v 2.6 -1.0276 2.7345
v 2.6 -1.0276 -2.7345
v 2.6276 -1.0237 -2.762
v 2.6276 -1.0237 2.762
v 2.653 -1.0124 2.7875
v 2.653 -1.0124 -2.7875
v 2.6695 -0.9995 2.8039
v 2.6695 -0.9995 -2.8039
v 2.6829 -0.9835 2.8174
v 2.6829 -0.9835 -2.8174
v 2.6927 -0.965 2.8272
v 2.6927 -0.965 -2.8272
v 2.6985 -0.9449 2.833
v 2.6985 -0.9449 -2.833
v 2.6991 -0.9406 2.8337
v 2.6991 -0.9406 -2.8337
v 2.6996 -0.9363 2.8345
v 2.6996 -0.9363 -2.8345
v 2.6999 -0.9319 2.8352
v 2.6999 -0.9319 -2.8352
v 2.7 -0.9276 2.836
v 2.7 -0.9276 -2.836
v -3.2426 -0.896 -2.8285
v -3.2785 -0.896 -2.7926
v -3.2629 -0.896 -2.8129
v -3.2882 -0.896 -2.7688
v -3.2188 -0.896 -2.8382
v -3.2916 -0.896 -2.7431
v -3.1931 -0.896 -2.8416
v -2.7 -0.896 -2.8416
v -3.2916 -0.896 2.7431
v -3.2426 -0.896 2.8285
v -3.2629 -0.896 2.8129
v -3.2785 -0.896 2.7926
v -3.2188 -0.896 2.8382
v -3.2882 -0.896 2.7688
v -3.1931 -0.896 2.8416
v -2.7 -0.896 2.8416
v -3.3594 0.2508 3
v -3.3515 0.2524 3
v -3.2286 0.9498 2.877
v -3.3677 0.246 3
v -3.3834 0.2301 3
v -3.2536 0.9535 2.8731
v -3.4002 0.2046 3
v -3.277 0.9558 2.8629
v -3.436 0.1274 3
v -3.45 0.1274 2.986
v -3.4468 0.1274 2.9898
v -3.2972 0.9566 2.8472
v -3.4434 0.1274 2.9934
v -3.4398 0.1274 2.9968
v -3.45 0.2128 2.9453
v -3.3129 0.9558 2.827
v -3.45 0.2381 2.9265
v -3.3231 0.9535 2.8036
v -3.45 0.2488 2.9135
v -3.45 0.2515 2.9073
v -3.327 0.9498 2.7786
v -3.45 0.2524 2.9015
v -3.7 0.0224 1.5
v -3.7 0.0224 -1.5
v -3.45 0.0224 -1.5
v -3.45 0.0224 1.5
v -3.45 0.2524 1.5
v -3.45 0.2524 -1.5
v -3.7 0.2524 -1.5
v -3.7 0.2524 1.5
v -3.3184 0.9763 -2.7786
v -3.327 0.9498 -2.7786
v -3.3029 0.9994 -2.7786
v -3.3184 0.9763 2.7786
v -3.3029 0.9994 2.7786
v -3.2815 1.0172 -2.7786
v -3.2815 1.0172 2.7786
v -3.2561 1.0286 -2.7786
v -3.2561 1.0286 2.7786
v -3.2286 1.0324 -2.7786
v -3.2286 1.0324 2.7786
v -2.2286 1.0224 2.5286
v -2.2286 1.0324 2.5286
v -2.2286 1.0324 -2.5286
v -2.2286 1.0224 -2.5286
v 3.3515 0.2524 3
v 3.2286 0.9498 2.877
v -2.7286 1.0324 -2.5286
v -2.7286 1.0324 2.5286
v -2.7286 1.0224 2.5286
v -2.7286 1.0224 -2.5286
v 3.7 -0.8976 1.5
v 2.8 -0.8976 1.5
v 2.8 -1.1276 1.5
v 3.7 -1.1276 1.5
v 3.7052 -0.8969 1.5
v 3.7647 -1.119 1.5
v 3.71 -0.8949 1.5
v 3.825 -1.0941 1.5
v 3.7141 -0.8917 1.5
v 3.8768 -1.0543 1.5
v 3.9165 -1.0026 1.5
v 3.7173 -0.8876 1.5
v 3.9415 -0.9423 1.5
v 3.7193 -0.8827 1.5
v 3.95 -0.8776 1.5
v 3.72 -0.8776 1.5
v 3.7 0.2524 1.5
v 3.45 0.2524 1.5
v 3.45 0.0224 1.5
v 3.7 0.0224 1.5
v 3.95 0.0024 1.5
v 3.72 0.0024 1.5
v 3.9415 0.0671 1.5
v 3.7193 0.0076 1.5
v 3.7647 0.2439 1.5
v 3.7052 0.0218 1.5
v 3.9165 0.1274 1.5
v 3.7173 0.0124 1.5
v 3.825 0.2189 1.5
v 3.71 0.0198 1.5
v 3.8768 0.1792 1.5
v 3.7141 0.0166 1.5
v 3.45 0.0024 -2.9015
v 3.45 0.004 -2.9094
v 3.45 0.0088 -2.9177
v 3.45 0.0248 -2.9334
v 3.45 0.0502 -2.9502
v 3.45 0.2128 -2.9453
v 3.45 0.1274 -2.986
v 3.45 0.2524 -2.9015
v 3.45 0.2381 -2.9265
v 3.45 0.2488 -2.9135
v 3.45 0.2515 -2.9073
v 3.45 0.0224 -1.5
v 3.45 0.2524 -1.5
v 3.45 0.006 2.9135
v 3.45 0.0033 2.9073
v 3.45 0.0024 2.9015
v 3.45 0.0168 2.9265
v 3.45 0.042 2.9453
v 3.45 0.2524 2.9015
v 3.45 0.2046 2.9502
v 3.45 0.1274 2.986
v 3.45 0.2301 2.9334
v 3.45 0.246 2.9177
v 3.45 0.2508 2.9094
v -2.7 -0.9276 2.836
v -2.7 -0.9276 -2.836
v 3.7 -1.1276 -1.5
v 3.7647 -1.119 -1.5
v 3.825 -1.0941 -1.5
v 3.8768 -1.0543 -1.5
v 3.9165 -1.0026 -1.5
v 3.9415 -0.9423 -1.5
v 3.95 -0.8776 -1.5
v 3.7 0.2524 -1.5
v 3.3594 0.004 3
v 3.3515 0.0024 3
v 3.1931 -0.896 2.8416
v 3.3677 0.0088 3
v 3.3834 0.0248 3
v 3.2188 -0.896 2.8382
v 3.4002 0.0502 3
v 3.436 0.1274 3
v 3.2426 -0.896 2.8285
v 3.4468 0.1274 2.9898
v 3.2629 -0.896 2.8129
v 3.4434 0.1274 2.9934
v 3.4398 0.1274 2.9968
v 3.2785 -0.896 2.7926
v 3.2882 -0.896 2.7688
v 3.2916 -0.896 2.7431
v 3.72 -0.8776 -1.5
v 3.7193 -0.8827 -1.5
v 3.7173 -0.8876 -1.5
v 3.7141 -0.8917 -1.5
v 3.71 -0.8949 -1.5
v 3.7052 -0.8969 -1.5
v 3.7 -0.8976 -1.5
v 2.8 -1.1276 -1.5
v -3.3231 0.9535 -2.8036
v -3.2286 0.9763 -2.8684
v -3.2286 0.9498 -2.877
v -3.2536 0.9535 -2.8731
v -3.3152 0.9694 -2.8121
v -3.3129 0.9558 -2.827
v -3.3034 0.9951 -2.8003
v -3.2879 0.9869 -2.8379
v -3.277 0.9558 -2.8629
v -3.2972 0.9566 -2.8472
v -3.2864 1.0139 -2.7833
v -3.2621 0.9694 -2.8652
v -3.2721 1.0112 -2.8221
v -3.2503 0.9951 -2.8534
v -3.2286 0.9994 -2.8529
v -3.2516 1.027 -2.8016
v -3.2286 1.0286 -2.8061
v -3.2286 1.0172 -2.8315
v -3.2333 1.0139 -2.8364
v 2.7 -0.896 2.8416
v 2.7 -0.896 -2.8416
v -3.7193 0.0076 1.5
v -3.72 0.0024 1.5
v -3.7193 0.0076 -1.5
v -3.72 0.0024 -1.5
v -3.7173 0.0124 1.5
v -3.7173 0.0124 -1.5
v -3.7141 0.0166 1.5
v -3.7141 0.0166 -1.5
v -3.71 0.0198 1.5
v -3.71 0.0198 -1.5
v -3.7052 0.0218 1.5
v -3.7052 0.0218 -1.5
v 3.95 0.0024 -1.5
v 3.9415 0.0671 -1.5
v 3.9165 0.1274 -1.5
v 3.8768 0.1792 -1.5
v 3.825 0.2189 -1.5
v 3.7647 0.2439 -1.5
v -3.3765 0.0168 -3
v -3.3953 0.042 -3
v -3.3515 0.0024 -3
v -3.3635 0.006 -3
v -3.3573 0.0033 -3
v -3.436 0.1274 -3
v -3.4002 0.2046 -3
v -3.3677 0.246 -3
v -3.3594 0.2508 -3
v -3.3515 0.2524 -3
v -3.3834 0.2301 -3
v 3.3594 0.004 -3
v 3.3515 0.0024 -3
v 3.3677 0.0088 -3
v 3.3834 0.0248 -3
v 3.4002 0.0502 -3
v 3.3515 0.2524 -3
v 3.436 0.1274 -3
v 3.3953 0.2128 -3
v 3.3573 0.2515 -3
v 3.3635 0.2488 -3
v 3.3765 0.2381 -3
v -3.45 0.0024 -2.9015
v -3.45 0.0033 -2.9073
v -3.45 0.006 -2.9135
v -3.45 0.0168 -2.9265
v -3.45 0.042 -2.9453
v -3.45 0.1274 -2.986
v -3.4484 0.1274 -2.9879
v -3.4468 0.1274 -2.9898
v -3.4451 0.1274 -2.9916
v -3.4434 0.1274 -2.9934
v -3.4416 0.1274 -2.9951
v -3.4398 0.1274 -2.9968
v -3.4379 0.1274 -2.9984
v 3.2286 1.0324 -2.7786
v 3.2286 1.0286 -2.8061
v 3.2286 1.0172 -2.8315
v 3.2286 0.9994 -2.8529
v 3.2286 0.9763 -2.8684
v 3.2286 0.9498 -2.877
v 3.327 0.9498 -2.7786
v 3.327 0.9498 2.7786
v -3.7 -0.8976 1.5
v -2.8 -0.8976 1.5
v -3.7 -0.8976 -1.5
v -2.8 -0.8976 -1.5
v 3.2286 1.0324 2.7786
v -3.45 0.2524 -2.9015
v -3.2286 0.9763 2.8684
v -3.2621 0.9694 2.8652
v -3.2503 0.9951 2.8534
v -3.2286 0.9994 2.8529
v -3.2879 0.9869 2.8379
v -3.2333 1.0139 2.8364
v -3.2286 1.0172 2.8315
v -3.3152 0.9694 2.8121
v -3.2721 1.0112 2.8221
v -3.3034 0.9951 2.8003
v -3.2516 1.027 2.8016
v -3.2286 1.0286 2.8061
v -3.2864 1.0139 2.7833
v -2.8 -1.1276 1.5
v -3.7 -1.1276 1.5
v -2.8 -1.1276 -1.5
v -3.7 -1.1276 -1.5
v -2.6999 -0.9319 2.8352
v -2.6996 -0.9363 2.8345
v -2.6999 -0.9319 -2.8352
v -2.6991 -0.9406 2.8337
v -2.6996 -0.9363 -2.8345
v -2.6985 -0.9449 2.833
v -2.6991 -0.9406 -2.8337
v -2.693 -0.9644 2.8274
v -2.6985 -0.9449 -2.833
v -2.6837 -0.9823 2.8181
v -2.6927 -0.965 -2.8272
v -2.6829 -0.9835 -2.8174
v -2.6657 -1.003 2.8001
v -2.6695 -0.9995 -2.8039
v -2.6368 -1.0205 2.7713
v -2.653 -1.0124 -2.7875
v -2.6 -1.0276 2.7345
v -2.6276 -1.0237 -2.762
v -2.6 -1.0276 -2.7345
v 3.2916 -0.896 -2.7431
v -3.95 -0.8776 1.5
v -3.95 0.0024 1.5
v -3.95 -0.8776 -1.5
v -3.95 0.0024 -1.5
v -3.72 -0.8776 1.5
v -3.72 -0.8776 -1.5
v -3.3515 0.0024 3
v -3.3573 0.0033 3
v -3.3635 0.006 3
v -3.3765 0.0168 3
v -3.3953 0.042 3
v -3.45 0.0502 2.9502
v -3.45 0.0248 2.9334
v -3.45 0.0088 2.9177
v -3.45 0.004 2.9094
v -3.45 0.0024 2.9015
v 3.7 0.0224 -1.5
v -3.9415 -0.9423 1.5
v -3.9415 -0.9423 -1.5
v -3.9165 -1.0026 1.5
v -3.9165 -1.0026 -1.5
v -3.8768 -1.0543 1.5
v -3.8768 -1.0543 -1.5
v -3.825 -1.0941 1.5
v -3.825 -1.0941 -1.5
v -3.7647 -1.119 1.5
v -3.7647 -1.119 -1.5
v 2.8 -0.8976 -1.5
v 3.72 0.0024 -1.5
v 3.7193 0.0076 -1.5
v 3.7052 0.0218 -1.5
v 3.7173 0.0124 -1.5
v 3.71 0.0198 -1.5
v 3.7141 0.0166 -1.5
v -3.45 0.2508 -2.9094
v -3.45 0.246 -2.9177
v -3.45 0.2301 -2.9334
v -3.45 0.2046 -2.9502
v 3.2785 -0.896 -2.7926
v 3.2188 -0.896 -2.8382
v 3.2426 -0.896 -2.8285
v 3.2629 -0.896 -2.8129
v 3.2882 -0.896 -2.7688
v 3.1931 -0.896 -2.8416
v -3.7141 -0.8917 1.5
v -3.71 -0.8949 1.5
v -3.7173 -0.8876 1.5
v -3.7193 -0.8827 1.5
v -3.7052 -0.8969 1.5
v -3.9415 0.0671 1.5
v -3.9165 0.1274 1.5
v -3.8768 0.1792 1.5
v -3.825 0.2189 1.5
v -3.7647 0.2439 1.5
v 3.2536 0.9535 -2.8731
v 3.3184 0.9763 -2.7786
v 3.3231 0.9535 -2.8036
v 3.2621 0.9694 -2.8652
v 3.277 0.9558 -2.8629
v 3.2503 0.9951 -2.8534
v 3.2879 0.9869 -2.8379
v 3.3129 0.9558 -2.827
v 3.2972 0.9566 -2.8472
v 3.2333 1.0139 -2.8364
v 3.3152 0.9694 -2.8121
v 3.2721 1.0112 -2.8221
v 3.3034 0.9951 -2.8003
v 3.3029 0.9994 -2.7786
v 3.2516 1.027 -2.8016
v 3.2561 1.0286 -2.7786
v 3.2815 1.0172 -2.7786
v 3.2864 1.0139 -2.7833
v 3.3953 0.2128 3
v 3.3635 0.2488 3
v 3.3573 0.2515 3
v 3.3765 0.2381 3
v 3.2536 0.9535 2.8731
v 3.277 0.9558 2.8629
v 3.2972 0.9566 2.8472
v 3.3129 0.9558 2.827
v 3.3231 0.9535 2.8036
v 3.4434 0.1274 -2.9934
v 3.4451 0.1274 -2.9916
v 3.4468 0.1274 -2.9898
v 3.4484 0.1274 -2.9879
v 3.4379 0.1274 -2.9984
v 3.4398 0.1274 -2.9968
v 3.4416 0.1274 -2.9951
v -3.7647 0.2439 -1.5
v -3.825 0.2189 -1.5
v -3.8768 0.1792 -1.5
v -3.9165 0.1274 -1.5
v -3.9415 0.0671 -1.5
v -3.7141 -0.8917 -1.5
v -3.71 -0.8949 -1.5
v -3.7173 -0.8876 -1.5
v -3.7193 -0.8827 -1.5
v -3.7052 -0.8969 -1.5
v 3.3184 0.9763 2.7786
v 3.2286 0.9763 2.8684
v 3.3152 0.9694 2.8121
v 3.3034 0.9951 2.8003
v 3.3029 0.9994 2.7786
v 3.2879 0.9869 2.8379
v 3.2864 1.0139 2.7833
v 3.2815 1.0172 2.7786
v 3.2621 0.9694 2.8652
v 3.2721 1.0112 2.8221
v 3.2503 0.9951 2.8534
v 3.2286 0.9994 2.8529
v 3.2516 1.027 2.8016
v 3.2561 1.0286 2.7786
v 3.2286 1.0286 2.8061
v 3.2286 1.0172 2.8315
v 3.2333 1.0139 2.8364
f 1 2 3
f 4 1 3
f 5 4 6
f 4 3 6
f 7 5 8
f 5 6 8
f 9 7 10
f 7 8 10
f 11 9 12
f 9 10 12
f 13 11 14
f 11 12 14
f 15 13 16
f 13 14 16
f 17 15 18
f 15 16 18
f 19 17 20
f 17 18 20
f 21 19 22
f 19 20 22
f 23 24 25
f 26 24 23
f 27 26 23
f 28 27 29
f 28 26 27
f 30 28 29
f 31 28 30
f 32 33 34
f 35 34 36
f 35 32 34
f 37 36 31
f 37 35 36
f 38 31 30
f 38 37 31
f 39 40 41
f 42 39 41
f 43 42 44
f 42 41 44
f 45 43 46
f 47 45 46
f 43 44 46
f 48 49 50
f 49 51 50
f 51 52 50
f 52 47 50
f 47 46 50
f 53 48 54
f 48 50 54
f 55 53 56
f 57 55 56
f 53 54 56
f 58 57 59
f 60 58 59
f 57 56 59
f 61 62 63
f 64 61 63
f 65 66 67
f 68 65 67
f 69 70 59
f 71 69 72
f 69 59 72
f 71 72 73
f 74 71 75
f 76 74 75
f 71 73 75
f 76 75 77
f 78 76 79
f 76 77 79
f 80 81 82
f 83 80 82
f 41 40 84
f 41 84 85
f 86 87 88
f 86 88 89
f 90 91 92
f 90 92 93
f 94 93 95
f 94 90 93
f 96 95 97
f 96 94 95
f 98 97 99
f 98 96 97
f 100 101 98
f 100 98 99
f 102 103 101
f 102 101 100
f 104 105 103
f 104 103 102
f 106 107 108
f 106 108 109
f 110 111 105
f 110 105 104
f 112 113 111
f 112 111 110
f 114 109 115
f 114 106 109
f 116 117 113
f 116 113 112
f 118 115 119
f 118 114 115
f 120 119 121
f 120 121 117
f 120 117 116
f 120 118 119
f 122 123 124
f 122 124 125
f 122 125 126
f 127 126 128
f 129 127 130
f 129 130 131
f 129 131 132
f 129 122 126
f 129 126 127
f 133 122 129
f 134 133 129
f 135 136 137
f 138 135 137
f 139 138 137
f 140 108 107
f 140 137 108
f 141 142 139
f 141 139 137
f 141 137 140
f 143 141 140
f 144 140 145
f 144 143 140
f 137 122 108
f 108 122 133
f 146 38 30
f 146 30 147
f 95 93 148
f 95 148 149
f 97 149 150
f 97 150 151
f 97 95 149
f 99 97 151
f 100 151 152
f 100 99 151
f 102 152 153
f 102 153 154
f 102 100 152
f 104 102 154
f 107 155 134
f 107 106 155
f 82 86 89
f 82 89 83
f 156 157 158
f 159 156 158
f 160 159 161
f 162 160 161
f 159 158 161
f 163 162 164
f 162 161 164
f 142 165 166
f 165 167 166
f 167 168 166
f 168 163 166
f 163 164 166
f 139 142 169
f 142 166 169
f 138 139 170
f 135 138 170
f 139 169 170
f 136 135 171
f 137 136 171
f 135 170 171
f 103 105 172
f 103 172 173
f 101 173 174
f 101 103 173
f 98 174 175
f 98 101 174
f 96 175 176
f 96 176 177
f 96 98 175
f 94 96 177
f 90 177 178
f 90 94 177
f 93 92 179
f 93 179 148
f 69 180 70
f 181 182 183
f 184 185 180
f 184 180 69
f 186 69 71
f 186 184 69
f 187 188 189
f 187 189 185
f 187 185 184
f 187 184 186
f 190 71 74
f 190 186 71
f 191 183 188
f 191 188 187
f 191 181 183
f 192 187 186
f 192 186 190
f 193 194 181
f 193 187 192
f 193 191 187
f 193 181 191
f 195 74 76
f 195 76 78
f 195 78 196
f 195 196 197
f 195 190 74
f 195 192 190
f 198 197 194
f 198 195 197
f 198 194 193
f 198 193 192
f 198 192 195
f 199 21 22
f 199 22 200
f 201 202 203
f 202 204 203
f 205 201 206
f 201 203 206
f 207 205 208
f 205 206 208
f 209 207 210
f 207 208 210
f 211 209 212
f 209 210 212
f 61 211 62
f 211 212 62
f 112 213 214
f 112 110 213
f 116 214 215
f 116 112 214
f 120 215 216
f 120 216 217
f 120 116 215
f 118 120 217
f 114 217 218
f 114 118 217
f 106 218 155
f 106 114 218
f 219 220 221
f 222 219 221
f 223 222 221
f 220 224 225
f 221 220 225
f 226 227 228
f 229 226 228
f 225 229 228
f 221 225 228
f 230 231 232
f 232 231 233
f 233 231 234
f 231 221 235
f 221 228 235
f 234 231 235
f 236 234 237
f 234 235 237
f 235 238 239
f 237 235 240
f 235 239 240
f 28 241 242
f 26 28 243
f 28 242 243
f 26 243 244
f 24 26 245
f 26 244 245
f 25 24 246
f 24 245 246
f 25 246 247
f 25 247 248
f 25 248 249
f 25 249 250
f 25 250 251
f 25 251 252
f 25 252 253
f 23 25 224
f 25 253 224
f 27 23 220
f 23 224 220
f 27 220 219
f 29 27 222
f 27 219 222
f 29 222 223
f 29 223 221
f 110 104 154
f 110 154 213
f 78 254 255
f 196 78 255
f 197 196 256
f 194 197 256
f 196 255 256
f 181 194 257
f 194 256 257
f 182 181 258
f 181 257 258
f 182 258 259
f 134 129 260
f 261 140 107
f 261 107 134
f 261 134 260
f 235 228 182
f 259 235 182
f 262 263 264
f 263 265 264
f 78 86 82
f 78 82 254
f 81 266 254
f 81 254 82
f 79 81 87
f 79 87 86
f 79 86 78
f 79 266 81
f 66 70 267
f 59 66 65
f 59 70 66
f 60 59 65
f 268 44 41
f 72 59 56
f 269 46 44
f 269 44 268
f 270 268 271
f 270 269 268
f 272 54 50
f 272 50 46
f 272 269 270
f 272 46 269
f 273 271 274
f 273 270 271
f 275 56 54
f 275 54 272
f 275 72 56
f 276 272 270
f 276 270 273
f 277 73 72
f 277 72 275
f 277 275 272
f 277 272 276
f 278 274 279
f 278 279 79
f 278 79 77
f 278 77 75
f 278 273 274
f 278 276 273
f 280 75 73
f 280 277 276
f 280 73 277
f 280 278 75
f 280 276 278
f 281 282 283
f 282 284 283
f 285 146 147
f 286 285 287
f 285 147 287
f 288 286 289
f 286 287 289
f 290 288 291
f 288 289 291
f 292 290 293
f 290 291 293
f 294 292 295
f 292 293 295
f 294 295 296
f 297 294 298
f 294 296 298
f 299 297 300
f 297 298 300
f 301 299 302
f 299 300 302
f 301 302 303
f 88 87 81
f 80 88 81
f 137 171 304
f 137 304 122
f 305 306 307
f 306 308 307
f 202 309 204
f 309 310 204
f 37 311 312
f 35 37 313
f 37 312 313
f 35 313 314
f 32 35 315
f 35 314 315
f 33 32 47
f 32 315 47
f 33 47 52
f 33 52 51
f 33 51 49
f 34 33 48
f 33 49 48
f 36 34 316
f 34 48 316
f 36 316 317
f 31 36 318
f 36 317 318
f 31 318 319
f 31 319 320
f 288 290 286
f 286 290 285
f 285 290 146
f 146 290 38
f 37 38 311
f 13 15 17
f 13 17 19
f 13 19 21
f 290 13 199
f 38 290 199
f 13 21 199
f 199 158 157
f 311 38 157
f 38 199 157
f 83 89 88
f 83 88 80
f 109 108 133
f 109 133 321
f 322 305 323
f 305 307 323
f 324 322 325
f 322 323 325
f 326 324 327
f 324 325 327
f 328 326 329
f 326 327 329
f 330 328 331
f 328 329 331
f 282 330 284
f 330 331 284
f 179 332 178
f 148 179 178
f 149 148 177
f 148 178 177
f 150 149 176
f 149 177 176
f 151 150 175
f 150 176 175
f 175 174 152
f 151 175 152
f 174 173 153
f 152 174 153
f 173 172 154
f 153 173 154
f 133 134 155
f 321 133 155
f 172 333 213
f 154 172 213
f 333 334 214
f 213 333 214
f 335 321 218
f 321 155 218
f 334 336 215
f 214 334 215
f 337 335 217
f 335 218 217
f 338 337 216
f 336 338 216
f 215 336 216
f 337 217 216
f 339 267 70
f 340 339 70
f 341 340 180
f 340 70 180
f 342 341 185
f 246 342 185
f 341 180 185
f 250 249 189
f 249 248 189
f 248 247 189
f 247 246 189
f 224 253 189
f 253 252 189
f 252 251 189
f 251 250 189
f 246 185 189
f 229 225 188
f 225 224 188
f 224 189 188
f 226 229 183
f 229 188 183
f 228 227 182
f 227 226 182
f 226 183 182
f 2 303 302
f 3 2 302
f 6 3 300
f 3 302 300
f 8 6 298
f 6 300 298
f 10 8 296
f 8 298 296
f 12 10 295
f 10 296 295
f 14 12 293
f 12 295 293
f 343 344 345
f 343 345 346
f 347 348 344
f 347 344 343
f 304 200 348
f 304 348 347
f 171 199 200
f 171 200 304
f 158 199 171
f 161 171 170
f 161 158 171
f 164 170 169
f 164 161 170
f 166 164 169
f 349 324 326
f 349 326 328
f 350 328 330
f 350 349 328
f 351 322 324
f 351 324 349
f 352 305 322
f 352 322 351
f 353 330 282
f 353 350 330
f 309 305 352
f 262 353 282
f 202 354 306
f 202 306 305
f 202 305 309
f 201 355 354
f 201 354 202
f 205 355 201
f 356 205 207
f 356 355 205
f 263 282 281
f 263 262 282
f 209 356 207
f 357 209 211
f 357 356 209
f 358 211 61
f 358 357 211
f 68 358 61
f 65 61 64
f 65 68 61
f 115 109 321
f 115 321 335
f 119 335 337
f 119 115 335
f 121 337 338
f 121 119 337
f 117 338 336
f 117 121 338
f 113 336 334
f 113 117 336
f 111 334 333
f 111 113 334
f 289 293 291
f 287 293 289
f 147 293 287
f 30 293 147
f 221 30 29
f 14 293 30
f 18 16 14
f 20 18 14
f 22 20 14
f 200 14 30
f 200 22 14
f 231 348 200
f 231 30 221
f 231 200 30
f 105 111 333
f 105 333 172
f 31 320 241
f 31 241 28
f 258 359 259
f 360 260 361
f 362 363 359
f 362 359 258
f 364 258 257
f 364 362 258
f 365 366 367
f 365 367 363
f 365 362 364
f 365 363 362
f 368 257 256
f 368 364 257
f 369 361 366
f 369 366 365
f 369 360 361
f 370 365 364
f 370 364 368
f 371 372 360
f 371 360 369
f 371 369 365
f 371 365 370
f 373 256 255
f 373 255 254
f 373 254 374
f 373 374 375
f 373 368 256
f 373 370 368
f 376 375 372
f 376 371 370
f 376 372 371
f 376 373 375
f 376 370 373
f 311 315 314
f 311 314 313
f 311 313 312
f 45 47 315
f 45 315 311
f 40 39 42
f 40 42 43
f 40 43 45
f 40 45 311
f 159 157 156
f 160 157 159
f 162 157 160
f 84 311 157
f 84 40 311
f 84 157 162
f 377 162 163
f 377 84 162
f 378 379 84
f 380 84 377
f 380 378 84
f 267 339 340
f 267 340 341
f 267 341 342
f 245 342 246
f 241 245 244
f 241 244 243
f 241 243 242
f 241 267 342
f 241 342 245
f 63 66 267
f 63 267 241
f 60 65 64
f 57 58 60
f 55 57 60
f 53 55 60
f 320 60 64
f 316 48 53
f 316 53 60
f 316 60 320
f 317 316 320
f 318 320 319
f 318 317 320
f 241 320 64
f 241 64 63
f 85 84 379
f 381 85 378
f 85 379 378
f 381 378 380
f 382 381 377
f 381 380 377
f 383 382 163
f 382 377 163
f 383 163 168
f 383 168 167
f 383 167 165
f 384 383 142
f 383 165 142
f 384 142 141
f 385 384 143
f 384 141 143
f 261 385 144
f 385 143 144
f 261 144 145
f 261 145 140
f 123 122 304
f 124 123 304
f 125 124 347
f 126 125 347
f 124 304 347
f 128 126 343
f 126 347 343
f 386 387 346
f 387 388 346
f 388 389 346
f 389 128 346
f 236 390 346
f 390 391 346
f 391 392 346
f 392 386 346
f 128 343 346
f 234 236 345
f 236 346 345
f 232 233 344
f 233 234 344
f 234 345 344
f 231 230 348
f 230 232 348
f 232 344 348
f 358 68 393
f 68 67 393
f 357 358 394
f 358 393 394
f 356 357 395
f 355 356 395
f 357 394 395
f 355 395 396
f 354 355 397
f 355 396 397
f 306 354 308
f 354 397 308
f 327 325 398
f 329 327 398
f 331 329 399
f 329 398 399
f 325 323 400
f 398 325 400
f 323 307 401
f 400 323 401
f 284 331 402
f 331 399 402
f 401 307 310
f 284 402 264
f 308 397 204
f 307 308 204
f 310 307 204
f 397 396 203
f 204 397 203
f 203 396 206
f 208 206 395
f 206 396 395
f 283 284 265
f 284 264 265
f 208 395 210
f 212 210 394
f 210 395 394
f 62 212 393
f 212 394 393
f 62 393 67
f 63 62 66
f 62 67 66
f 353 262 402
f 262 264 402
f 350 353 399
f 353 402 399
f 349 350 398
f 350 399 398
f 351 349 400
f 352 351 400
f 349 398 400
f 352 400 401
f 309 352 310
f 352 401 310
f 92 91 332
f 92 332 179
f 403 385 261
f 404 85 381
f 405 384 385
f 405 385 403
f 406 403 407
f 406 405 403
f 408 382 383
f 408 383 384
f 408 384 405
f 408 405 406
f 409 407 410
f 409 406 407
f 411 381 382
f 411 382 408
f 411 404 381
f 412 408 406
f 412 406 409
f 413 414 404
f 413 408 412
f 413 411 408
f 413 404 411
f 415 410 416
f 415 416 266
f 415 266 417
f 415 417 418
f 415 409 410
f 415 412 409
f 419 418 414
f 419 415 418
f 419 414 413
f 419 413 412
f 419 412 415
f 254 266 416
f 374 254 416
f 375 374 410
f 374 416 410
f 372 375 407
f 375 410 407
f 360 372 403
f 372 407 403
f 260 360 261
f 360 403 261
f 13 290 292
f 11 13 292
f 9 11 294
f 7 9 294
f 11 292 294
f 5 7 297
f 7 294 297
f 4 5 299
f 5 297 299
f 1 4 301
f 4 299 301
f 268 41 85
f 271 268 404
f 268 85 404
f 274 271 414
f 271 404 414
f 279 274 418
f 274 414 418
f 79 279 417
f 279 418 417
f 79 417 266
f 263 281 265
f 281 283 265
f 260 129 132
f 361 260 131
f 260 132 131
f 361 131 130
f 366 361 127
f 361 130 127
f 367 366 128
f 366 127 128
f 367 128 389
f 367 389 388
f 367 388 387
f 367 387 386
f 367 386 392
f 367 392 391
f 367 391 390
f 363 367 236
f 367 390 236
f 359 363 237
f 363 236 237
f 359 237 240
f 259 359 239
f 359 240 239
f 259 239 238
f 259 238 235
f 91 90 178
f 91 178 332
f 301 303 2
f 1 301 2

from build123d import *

# Parameters (mm, degrees)
EXTRUDE2_DEPTH  = 3
EXTRUDE10_DEPTH = 5.687050188
EXTRUDE6_DEPTH  = 1.5
FILLET1_R       = 0.1
SKETCH17_W      = 0.5
SKETCH17_H      = 5.057109984
EXTRUDE11_DEPTH = 0.01


with BuildPart() as part:
    # Sketch5 → Extrude2 (new, symmetric)
    with BuildSketch(Plane.XY):
        Polygon((-3.45, 0.252443442), (-3.45, 0.002443442), (-3.291571563, -0.896048874), (-2.7, -0.896048874), (-2.7, -1.027556558), (2.7, -1.027556558), (2.7, -0.896048874), (3.291571563, -0.896048874), (3.45, 0.002443442), (3.45, 0.252443442), (3.312464955, 1.032443442), (-3.312464955, 1.032443442), align=None)
    extrude(amount=EXTRUDE2_DEPTH, both=True)

    # Sketch15 → Extrude10 (cut, symmetric)
    with BuildSketch(Plane(origin=(0, 0, 0), x_dir=(0, 0, -1), z_dir=(1, 0, 0))):
        Polygon((-1.365649055, -24.756382672), (2.66841867, -1.878047724), (3, 0.002443442), (3, 0.252443442), (2.606426498, 2.484509687), (-1.427641227, 25.362844635), (45.034863515, 25.420313828), (45.096855687, -24.698913478), align=None)
    extrude10 = extrude(amount=EXTRUDE10_DEPTH, both=True, mode=Mode.SUBTRACT)

    # Mirror1: Extrude10 across plane
    add(extrude10.mirror(Plane.XY), mode=Mode.SUBTRACT)

    # Sketch9 → Extrude6 (add, symmetric)
    with BuildSketch(Plane.XY):
        with BuildLine():
            Line((-3.45, 0.252443442), (-3.7, 0.252443442))
            ThreePointArc((-3.7, 0.252443442), (-3.876776695, 0.179220137), (-3.95, 0.002443442))
            Line((-3.95, 0.002443442), (-3.95, -0.877556558))
            ThreePointArc((-3.95, -0.877556558), (-3.876776695, -1.054333254), (-3.7, -1.127556558))
            Line((-3.7, -1.127556558), (-2.8, -1.127556558))
            Line((-2.8, -1.127556558), (-2.8, -0.897556558))
            Line((-2.8, -0.897556558), (-3.7, -0.897556558))
            ThreePointArc((-3.7, -0.897556558), (-3.714142136, -0.891698694), (-3.72, -0.877556558))
            Line((-3.72, -0.877556558), (-3.72, 0.002443442))
            ThreePointArc((-3.72, 0.002443442), (-3.714142136, 0.016585577), (-3.7, 0.022443442))
            Line((-3.7, 0.022443442), (-3.45, 0.022443442))
            Line((-3.45, 0.022443442), (-3.45, 0.252443442))
        make_face()
        with BuildLine():
            Line((3.45, 0.252443442), (3.45, 0.022443442))
            Line((3.45, 0.022443442), (3.7, 0.022443442))
            ThreePointArc((3.7, 0.022443442), (3.714142136, 0.016585577), (3.72, 0.002443442))
            Line((3.72, 0.002443442), (3.72, -0.877556558))
            ThreePointArc((3.72, -0.877556558), (3.714142136, -0.891698694), (3.7, -0.897556558))
            Line((3.7, -0.897556558), (2.8, -0.897556558))
            Line((2.8, -0.897556558), (2.8, -1.127556558))
            Line((2.8, -1.127556558), (3.7, -1.127556558))
            ThreePointArc((3.7, -1.127556558), (3.876776695, -1.054333254), (3.95, -0.877556558))
            Line((3.95, -0.877556558), (3.95, 0.002443442))
            ThreePointArc((3.95, 0.002443442), (3.876776695, 0.179220137), (3.7, 0.252443442))
            Line((3.7, 0.252443442), (3.45, 0.252443442))
        make_face()
    extrude(amount=EXTRUDE6_DEPTH, both=True)

    # Fillet1
    # the kernel refuses this fillet: 0.1 mm, written as the material it takes off along each edge
    with BuildSketch(Plane(origin=(-3.228554992, 0.932443442, 2.778554992), x_dir=(-0.707106781186547, 0, -0.707106781186548), z_dir=(-0.508220601732601, 0.6952867321825629, 0.5082206017326002))) as fillet1_piece_1_section:
        Polygon((-0.186219601, -0.186219601), (0.186219601, -0.186219601), (0.186219601, 0.186219601), (-0.186219601, 0.186219601), align=None)
    fillet1_piece_1 = extrude(amount=0.186219601, mode=Mode.PRIVATE)
    fillet1_piece_1 = split(fillet1_piece_1, bisect_by=Plane(origin=(-3.228554992, 0.932443442, 2.778554992), z_dir=(0, 0, 1)), keep=Keep.TOP, mode=Mode.PRIVATE)
    fillet1_piece_1 = split(fillet1_piece_1, bisect_by=Plane(origin=(-3.228554992, 0.932443442, 2.778554992), z_dir=(0.17108786974602874, 0.9702875252478149, -0.1710878697460364)), keep=Keep.TOP, mode=Mode.PRIVATE)
    fillet1_piece_1 = split(fillet1_piece_1, bisect_by=Plane(origin=(-3.228554992, 0.932443442, 2.778554992), z_dir=(-1, 0, 0)), keep=Keep.TOP, mode=Mode.PRIVATE)
    fillet1_piece_1 = split(fillet1_piece_1, bisect_by=Plane(origin=(-3.228554992, 1.032443442, 2.778554992), z_dir=(0, -1, 0)), keep=Keep.TOP, mode=Mode.PRIVATE)
    fillet1_piece_1 = split(fillet1_piece_1, bisect_by=Plane(origin=(-3.327035767, 0.94980826, 2.778554992), z_dir=(0.9848077530122094, -0.17364817766692353, 0)), keep=Keep.TOP, mode=Mode.PRIVATE)
    fillet1_piece_1 = split(fillet1_piece_1, bisect_by=Plane(origin=(-3.228554992, 0.94980826, 2.877035767), z_dir=(0, -0.17364817766693108, -0.984807753012208)), keep=Keep.TOP, mode=Mode.PRIVATE)
    fillet1_piece_1 = fillet1_piece_1 - Plane(origin=(-3.228554992, 0.932443442, 2.778554992), x_dir=(0.508220601732601, -0.6952867321825629, -0.5082206017326002), z_dir=(-0.707106781186547, 0, -0.707106781186548)) * Sphere(FILLET1_R, mode=Mode.PRIVATE)
    add(fillet1_piece_1, mode=Mode.SUBTRACT)
    with BuildSketch(Plane(origin=(-3.228554992, 0.932443442, -2.778554992), x_dir=(0.707106781186547, 0, -0.707106781186548), z_dir=(-0.508220601732601, 0.6952867321825629, -0.5082206017326002))) as fillet1_piece_2_section:
        Polygon((-0.186219601, -0.186219601), (0.186219601, -0.186219601), (0.186219601, 0.186219601), (-0.186219601, 0.186219601), align=None)
    fillet1_piece_2 = extrude(amount=0.186219601, mode=Mode.PRIVATE)
    fillet1_piece_2 = split(fillet1_piece_2, bisect_by=Plane(origin=(-3.228554992, 0.932443442, -2.778554992), z_dir=(0, 0, -1)), keep=Keep.TOP, mode=Mode.PRIVATE)
    fillet1_piece_2 = split(fillet1_piece_2, bisect_by=Plane(origin=(-3.228554992, 0.932443442, -2.778554992), z_dir=(0.17108786974602874, 0.9702875252478149, 0.1710878697460364)), keep=Keep.TOP, mode=Mode.PRIVATE)
    fillet1_piece_2 = split(fillet1_piece_2, bisect_by=Plane(origin=(-3.228554992, 0.932443442, -2.778554992), z_dir=(-1, 0, 0)), keep=Keep.TOP, mode=Mode.PRIVATE)
    fillet1_piece_2 = split(fillet1_piece_2, bisect_by=Plane(origin=(-3.228554992, 1.032443442, -2.778554992), z_dir=(0, -1, 0)), keep=Keep.TOP, mode=Mode.PRIVATE)
    fillet1_piece_2 = split(fillet1_piece_2, bisect_by=Plane(origin=(-3.327035767, 0.94980826, -2.778554992), z_dir=(0.9848077530122094, -0.17364817766692353, 0)), keep=Keep.TOP, mode=Mode.PRIVATE)
    fillet1_piece_2 = split(fillet1_piece_2, bisect_by=Plane(origin=(-3.228554992, 0.94980826, -2.877035767), z_dir=(0, -0.17364817766693108, 0.984807753012208)), keep=Keep.TOP, mode=Mode.PRIVATE)
    fillet1_piece_2 = fillet1_piece_2 - Plane(origin=(-3.228554992, 0.932443442, -2.778554992), x_dir=(0.508220601732601, -0.6952867321825629, 0.5082206017326002), z_dir=(0.707106781186547, 0, -0.707106781186548)) * Sphere(FILLET1_R, mode=Mode.PRIVATE)
    add(fillet1_piece_2, mode=Mode.SUBTRACT)
    with BuildSketch(Plane(origin=(3.228554992, 0.932443442, -2.778554992), x_dir=(0.707106781186547, 0, 0.707106781186548), z_dir=(0.508220601732601, 0.6952867321825628, -0.5082206017326003))) as fillet1_piece_3_section:
        Polygon((-0.186219601, -0.186219601), (0.186219601, -0.186219601), (0.186219601, 0.186219601), (-0.186219601, 0.186219601), align=None)
    fillet1_piece_3 = extrude(amount=0.186219601, mode=Mode.PRIVATE)
    fillet1_piece_3 = split(fillet1_piece_3, bisect_by=Plane(origin=(3.228554992, 0.932443442, -2.778554992), z_dir=(0, 0, -1)), keep=Keep.TOP, mode=Mode.PRIVATE)
    fillet1_piece_3 = split(fillet1_piece_3, bisect_by=Plane(origin=(3.228554992, 0.932443442, -2.778554992), z_dir=(-0.17108786974602816, 0.970287525247815, 0.17108786974603643)), keep=Keep.TOP, mode=Mode.PRIVATE)
    fillet1_piece_3 = split(fillet1_piece_3, bisect_by=Plane(origin=(3.228554992, 0.932443442, -2.778554992), z_dir=(1, 0, 0)), keep=Keep.TOP, mode=Mode.PRIVATE)
    fillet1_piece_3 = split(fillet1_piece_3, bisect_by=Plane(origin=(3.228554992, 1.032443442, -2.778554992), z_dir=(0, -1, 0)), keep=Keep.TOP, mode=Mode.PRIVATE)
    fillet1_piece_3 = split(fillet1_piece_3, bisect_by=Plane(origin=(3.327035767, 0.94980826, -2.778554992), z_dir=(-0.9848077530122094, -0.17364817766692292, 0)), keep=Keep.TOP, mode=Mode.PRIVATE)
    fillet1_piece_3 = split(fillet1_piece_3, bisect_by=Plane(origin=(3.228554992, 0.94980826, -2.877035767), z_dir=(0, -0.17364817766693108, 0.984807753012208)), keep=Keep.TOP, mode=Mode.PRIVATE)
    fillet1_piece_3 = fillet1_piece_3 - Plane(origin=(3.228554992, 0.932443442, -2.778554992), x_dir=(-0.508220601732601, -0.6952867321825628, 0.5082206017326003), z_dir=(0.707106781186547, 0, 0.707106781186548)) * Sphere(FILLET1_R, mode=Mode.PRIVATE)
    add(fillet1_piece_3, mode=Mode.SUBTRACT)
    with BuildSketch(Plane(origin=(3.228554992, 0.932443442, 2.778554992), x_dir=(-0.707106781186547, 0, 0.707106781186548), z_dir=(0.508220601732601, 0.6952867321825628, 0.5082206017326003))) as fillet1_piece_4_section:
        Polygon((-0.186219601, -0.186219601), (0.186219601, -0.186219601), (0.186219601, 0.186219601), (-0.186219601, 0.186219601), align=None)
    fillet1_piece_4 = extrude(amount=0.186219601, mode=Mode.PRIVATE)
    fillet1_piece_4 = split(fillet1_piece_4, bisect_by=Plane(origin=(3.228554992, 0.932443442, 2.778554992), z_dir=(0, 0, 1)), keep=Keep.TOP, mode=Mode.PRIVATE)
    fillet1_piece_4 = split(fillet1_piece_4, bisect_by=Plane(origin=(3.228554992, 0.932443442, 2.778554992), z_dir=(-0.17108786974602816, 0.970287525247815, -0.17108786974603643)), keep=Keep.TOP, mode=Mode.PRIVATE)
    fillet1_piece_4 = split(fillet1_piece_4, bisect_by=Plane(origin=(3.228554992, 0.932443442, 2.778554992), z_dir=(1, 0, 0)), keep=Keep.TOP, mode=Mode.PRIVATE)
    fillet1_piece_4 = split(fillet1_piece_4, bisect_by=Plane(origin=(3.228554992, 1.032443442, 2.778554992), z_dir=(0, -1, 0)), keep=Keep.TOP, mode=Mode.PRIVATE)
    fillet1_piece_4 = split(fillet1_piece_4, bisect_by=Plane(origin=(3.327035767, 0.94980826, 2.778554992), z_dir=(-0.9848077530122094, -0.17364817766692292, 0)), keep=Keep.TOP, mode=Mode.PRIVATE)
    fillet1_piece_4 = split(fillet1_piece_4, bisect_by=Plane(origin=(3.228554992, 0.94980826, 2.877035767), z_dir=(0, -0.17364817766693108, -0.984807753012208)), keep=Keep.TOP, mode=Mode.PRIVATE)
    fillet1_piece_4 = fillet1_piece_4 - Plane(origin=(3.228554992, 0.932443442, 2.778554992), x_dir=(-0.508220601732601, -0.6952867321825628, -0.5082206017326003), z_dir=(-0.707106781186547, 0, 0.707106781186548)) * Sphere(FILLET1_R, mode=Mode.PRIVATE)
    add(fillet1_piece_4, mode=Mode.SUBTRACT)
    with BuildSketch(Plane(origin=(-2.909774908, -1.027556558, -2.81838321), x_dir=(0, 0.9848077530122077, -0.17364817766693205), z_dir=(1, 0, 0))) as fillet1_piece_5:
        with BuildLine():
            CenterArc((FILLET1_R * 0.839099631177, FILLET1_R), FILLET1_R, 190, 80)
            Line((-FILLET1_R * 0.145708121835, FILLET1_R * 0.826351822333), (0, 0))
            Line((0, 0), (FILLET1_R * 0.839099631177, 0))
        make_face()
    extrude(amount=5.819549816, mode=Mode.SUBTRACT)
    with BuildSketch(Plane(origin=(-2.7, -1.027556558, -3.06838321), x_dir=(0, 1, 0), z_dir=(0, 0, 1)), Plane(origin=(2.7, -1.027556558, -3.06838321), x_dir=(-1, 0, 0), z_dir=(0, 0, 1))) as fillet1_piece_6:
        with BuildLine():
            CenterArc((FILLET1_R, -FILLET1_R), FILLET1_R, 90, 90)
            Line((0, -FILLET1_R), (0, 0))
            Line((0, 0), (FILLET1_R, 0))
        make_face()
    extrude(amount=6.13676642, mode=Mode.SUBTRACT)
    with BuildSketch(Plane(origin=(-2.909774908, -1.027556558, 2.81838321), x_dir=(0, 0.9848077530122077, 0.17364817766693205), z_dir=(1, 0, 0))) as fillet1_piece_7:
        with BuildLine():
            CenterArc((FILLET1_R * 0.839099631177, -FILLET1_R), FILLET1_R, 90, 80)
            Line((-FILLET1_R * 0.145708121835, -FILLET1_R * 0.826351822333), (0, 0))
            Line((0, 0), (FILLET1_R * 0.839099631177, 0))
        make_face()
    extrude(amount=5.819549816, mode=Mode.SUBTRACT)
    with BuildSketch(Plane(origin=(-3.312464955, 1.032443442, 2.778554992), x_dir=(-0.17364817766692459, -0.9848077530122091, 0), z_dir=(0, 0, -1)), Plane(origin=(3.312464955, 1.032443442, 2.778554992), x_dir=(-1, 0, 0), z_dir=(0, 0, -1))) as fillet1_piece_8:
        with BuildLine():
            CenterArc((FILLET1_R * 0.839099631177, -FILLET1_R), FILLET1_R, 90, 80)
            Line((-FILLET1_R * 0.145708121835, -FILLET1_R * 0.826351822333), (0, 0))
            Line((0, 0), (FILLET1_R * 0.839099631177, 0))
        make_face()
    extrude(amount=5.557109984, mode=Mode.SUBTRACT)
    with BuildSketch(Plane(origin=(3.228554992, 1.032443442, -2.862464955), x_dir=(0, 0, 1), z_dir=(-1, 0, 0))) as fillet1_piece_9:
        with BuildLine():
            CenterArc((FILLET1_R * 0.839099631177, -FILLET1_R), FILLET1_R, 90, 80)
            Line((-FILLET1_R * 0.145708121835, -FILLET1_R * 0.826351822333), (0, 0))
            Line((0, 0), (FILLET1_R * 0.839099631177, 0))
        make_face()
    extrude(amount=6.457109984, mode=Mode.SUBTRACT)
    with BuildSketch(Plane(origin=(3.228554992, 1.032443442, 2.862464955), x_dir=(0, 0, -1), z_dir=(-1, 0, 0))) as fillet1_piece_10:
        with BuildLine():
            CenterArc((FILLET1_R * 0.839099631177, FILLET1_R), FILLET1_R, 190, 80)
            Line((-FILLET1_R * 0.145708121835, FILLET1_R * 0.826351822333), (0, 0))
            Line((0, 0), (FILLET1_R * 0.839099631177, 0))
        make_face()
    extrude(amount=6.457109984, mode=Mode.SUBTRACT)
    with BuildSketch(Plane(origin=(-3.574503319, 0.708536853, -3.124503319), x_dir=(-0.029709096802312214, 0.16848866057223963, 0.985255774317392), z_dir=(0.17108786974603277, -0.9702875252478144, 0.17108786974603588)), Plane(origin=(3.250070456, -1.131413344, 2.800070456), x_dir=(-0.9852557743173926, 0.1684886605722357, 0.029709096802311194), z_dir=(0.17108786974603182, 0.9702875252478146, 0.1710878697460359))) as fillet1_piece_11:
        with BuildLine():
            CenterArc((FILLET1_R * 0.970287525248, -FILLET1_R), FILLET1_R, 90, 88.272058928)
            Line((-FILLET1_R * 0.0292577488659, -FILLET1_R * 0.969846310393), (0, 0))
            Line((0, 0), (FILLET1_R * 0.970287525248, 0))
        make_face()
    extrude(amount=1.896293778, mode=Mode.SUBTRACT)
    with BuildSketch(Plane(origin=(-3.324153131, 0.966156504, -2.874153131), x_dir=(-0.029709096802307676, -0.16848866057224096, 0.9852557743173918), z_dir=(-0.17108786974602877, -0.970287525247815, -0.17108786974603643)), Plane(origin=(3.574503319, -0.453649969, 3.124503319), x_dir=(-0.9852557743173932, -0.16848866057223175, 0.02970909680231244), z_dir=(-0.17108786974602816, 0.970287525247815, -0.17108786974603643))) as fillet1_piece_12:
        with BuildLine():
            CenterArc((FILLET1_R * 0.970287525248, -FILLET1_R), FILLET1_R, 90, 88.272058928)
            Line((-FILLET1_R * 0.0292577488659, -FILLET1_R * 0.969846310393), (0, 0))
            Line((0, 0), (FILLET1_R * 0.970287525248, 0))
        make_face()
    extrude(amount=1.46328427, mode=Mode.SUBTRACT)
    with BuildSketch(Plane(origin=(-3.324153131, 0.966156504, 2.874153131), x_dir=(-0.029709096802303235, -0.16848866057224177, -0.9852557743173918), z_dir=(-0.17108786974602877, -0.970287525247815, 0.17108786974603643)), Plane(origin=(3.574503319, -0.453649969, -3.124503319), x_dir=(-0.9852557743173932, -0.16848866057223175, -0.02970909680231244), z_dir=(-0.17108786974602816, 0.970287525247815, 0.17108786974603643))) as fillet1_piece_13:
        with BuildLine():
            CenterArc((FILLET1_R * 0.970287525248, FILLET1_R), FILLET1_R, 181.727941072, 88.272058928)
            Line((-FILLET1_R * 0.0292577488659, FILLET1_R * 0.969846310393), (0, 0))
            Line((0, 0), (FILLET1_R * 0.970287525248, 0))
        make_face()
    extrude(amount=1.46328427, mode=Mode.SUBTRACT)
    with BuildSketch(Plane(origin=(-3.574503319, 0.708536853, 3.124503319), x_dir=(-0.029709096802312214, 0.16848866057223963, -0.985255774317392), z_dir=(0.17108786974603277, -0.9702875252478144, -0.17108786974603588)), Plane(origin=(3.250070456, -1.131413344, -2.800070456), x_dir=(-0.9852557743173926, 0.1684886605722357, -0.029709096802311194), z_dir=(0.17108786974603182, 0.9702875252478146, -0.1710878697460359))) as fillet1_piece_14:
        with BuildLine():
            CenterArc((FILLET1_R * 0.970287525248, FILLET1_R), FILLET1_R, 181.727941072, 88.272058928)
            Line((-FILLET1_R * 0.0292577488659, FILLET1_R * 0.969846310393), (0, 0))
            Line((0, 0), (FILLET1_R * 0.970287525248, 0))
        make_face()
    extrude(amount=1.896293778, mode=Mode.SUBTRACT)

    # Sketch17 → Extrude11 (cut)
    with BuildSketch(Plane(origin=(0, 1.032443442, 0), x_dir=(1, 0, 0), z_dir=(0, 1, 0))):
        with Locations((-2.478554992, 0)):
            Rectangle(SKETCH17_W, SKETCH17_H)
    extrude(amount=-EXTRUDE11_DEPTH, mode=Mode.SUBTRACT)


solid = part.part
